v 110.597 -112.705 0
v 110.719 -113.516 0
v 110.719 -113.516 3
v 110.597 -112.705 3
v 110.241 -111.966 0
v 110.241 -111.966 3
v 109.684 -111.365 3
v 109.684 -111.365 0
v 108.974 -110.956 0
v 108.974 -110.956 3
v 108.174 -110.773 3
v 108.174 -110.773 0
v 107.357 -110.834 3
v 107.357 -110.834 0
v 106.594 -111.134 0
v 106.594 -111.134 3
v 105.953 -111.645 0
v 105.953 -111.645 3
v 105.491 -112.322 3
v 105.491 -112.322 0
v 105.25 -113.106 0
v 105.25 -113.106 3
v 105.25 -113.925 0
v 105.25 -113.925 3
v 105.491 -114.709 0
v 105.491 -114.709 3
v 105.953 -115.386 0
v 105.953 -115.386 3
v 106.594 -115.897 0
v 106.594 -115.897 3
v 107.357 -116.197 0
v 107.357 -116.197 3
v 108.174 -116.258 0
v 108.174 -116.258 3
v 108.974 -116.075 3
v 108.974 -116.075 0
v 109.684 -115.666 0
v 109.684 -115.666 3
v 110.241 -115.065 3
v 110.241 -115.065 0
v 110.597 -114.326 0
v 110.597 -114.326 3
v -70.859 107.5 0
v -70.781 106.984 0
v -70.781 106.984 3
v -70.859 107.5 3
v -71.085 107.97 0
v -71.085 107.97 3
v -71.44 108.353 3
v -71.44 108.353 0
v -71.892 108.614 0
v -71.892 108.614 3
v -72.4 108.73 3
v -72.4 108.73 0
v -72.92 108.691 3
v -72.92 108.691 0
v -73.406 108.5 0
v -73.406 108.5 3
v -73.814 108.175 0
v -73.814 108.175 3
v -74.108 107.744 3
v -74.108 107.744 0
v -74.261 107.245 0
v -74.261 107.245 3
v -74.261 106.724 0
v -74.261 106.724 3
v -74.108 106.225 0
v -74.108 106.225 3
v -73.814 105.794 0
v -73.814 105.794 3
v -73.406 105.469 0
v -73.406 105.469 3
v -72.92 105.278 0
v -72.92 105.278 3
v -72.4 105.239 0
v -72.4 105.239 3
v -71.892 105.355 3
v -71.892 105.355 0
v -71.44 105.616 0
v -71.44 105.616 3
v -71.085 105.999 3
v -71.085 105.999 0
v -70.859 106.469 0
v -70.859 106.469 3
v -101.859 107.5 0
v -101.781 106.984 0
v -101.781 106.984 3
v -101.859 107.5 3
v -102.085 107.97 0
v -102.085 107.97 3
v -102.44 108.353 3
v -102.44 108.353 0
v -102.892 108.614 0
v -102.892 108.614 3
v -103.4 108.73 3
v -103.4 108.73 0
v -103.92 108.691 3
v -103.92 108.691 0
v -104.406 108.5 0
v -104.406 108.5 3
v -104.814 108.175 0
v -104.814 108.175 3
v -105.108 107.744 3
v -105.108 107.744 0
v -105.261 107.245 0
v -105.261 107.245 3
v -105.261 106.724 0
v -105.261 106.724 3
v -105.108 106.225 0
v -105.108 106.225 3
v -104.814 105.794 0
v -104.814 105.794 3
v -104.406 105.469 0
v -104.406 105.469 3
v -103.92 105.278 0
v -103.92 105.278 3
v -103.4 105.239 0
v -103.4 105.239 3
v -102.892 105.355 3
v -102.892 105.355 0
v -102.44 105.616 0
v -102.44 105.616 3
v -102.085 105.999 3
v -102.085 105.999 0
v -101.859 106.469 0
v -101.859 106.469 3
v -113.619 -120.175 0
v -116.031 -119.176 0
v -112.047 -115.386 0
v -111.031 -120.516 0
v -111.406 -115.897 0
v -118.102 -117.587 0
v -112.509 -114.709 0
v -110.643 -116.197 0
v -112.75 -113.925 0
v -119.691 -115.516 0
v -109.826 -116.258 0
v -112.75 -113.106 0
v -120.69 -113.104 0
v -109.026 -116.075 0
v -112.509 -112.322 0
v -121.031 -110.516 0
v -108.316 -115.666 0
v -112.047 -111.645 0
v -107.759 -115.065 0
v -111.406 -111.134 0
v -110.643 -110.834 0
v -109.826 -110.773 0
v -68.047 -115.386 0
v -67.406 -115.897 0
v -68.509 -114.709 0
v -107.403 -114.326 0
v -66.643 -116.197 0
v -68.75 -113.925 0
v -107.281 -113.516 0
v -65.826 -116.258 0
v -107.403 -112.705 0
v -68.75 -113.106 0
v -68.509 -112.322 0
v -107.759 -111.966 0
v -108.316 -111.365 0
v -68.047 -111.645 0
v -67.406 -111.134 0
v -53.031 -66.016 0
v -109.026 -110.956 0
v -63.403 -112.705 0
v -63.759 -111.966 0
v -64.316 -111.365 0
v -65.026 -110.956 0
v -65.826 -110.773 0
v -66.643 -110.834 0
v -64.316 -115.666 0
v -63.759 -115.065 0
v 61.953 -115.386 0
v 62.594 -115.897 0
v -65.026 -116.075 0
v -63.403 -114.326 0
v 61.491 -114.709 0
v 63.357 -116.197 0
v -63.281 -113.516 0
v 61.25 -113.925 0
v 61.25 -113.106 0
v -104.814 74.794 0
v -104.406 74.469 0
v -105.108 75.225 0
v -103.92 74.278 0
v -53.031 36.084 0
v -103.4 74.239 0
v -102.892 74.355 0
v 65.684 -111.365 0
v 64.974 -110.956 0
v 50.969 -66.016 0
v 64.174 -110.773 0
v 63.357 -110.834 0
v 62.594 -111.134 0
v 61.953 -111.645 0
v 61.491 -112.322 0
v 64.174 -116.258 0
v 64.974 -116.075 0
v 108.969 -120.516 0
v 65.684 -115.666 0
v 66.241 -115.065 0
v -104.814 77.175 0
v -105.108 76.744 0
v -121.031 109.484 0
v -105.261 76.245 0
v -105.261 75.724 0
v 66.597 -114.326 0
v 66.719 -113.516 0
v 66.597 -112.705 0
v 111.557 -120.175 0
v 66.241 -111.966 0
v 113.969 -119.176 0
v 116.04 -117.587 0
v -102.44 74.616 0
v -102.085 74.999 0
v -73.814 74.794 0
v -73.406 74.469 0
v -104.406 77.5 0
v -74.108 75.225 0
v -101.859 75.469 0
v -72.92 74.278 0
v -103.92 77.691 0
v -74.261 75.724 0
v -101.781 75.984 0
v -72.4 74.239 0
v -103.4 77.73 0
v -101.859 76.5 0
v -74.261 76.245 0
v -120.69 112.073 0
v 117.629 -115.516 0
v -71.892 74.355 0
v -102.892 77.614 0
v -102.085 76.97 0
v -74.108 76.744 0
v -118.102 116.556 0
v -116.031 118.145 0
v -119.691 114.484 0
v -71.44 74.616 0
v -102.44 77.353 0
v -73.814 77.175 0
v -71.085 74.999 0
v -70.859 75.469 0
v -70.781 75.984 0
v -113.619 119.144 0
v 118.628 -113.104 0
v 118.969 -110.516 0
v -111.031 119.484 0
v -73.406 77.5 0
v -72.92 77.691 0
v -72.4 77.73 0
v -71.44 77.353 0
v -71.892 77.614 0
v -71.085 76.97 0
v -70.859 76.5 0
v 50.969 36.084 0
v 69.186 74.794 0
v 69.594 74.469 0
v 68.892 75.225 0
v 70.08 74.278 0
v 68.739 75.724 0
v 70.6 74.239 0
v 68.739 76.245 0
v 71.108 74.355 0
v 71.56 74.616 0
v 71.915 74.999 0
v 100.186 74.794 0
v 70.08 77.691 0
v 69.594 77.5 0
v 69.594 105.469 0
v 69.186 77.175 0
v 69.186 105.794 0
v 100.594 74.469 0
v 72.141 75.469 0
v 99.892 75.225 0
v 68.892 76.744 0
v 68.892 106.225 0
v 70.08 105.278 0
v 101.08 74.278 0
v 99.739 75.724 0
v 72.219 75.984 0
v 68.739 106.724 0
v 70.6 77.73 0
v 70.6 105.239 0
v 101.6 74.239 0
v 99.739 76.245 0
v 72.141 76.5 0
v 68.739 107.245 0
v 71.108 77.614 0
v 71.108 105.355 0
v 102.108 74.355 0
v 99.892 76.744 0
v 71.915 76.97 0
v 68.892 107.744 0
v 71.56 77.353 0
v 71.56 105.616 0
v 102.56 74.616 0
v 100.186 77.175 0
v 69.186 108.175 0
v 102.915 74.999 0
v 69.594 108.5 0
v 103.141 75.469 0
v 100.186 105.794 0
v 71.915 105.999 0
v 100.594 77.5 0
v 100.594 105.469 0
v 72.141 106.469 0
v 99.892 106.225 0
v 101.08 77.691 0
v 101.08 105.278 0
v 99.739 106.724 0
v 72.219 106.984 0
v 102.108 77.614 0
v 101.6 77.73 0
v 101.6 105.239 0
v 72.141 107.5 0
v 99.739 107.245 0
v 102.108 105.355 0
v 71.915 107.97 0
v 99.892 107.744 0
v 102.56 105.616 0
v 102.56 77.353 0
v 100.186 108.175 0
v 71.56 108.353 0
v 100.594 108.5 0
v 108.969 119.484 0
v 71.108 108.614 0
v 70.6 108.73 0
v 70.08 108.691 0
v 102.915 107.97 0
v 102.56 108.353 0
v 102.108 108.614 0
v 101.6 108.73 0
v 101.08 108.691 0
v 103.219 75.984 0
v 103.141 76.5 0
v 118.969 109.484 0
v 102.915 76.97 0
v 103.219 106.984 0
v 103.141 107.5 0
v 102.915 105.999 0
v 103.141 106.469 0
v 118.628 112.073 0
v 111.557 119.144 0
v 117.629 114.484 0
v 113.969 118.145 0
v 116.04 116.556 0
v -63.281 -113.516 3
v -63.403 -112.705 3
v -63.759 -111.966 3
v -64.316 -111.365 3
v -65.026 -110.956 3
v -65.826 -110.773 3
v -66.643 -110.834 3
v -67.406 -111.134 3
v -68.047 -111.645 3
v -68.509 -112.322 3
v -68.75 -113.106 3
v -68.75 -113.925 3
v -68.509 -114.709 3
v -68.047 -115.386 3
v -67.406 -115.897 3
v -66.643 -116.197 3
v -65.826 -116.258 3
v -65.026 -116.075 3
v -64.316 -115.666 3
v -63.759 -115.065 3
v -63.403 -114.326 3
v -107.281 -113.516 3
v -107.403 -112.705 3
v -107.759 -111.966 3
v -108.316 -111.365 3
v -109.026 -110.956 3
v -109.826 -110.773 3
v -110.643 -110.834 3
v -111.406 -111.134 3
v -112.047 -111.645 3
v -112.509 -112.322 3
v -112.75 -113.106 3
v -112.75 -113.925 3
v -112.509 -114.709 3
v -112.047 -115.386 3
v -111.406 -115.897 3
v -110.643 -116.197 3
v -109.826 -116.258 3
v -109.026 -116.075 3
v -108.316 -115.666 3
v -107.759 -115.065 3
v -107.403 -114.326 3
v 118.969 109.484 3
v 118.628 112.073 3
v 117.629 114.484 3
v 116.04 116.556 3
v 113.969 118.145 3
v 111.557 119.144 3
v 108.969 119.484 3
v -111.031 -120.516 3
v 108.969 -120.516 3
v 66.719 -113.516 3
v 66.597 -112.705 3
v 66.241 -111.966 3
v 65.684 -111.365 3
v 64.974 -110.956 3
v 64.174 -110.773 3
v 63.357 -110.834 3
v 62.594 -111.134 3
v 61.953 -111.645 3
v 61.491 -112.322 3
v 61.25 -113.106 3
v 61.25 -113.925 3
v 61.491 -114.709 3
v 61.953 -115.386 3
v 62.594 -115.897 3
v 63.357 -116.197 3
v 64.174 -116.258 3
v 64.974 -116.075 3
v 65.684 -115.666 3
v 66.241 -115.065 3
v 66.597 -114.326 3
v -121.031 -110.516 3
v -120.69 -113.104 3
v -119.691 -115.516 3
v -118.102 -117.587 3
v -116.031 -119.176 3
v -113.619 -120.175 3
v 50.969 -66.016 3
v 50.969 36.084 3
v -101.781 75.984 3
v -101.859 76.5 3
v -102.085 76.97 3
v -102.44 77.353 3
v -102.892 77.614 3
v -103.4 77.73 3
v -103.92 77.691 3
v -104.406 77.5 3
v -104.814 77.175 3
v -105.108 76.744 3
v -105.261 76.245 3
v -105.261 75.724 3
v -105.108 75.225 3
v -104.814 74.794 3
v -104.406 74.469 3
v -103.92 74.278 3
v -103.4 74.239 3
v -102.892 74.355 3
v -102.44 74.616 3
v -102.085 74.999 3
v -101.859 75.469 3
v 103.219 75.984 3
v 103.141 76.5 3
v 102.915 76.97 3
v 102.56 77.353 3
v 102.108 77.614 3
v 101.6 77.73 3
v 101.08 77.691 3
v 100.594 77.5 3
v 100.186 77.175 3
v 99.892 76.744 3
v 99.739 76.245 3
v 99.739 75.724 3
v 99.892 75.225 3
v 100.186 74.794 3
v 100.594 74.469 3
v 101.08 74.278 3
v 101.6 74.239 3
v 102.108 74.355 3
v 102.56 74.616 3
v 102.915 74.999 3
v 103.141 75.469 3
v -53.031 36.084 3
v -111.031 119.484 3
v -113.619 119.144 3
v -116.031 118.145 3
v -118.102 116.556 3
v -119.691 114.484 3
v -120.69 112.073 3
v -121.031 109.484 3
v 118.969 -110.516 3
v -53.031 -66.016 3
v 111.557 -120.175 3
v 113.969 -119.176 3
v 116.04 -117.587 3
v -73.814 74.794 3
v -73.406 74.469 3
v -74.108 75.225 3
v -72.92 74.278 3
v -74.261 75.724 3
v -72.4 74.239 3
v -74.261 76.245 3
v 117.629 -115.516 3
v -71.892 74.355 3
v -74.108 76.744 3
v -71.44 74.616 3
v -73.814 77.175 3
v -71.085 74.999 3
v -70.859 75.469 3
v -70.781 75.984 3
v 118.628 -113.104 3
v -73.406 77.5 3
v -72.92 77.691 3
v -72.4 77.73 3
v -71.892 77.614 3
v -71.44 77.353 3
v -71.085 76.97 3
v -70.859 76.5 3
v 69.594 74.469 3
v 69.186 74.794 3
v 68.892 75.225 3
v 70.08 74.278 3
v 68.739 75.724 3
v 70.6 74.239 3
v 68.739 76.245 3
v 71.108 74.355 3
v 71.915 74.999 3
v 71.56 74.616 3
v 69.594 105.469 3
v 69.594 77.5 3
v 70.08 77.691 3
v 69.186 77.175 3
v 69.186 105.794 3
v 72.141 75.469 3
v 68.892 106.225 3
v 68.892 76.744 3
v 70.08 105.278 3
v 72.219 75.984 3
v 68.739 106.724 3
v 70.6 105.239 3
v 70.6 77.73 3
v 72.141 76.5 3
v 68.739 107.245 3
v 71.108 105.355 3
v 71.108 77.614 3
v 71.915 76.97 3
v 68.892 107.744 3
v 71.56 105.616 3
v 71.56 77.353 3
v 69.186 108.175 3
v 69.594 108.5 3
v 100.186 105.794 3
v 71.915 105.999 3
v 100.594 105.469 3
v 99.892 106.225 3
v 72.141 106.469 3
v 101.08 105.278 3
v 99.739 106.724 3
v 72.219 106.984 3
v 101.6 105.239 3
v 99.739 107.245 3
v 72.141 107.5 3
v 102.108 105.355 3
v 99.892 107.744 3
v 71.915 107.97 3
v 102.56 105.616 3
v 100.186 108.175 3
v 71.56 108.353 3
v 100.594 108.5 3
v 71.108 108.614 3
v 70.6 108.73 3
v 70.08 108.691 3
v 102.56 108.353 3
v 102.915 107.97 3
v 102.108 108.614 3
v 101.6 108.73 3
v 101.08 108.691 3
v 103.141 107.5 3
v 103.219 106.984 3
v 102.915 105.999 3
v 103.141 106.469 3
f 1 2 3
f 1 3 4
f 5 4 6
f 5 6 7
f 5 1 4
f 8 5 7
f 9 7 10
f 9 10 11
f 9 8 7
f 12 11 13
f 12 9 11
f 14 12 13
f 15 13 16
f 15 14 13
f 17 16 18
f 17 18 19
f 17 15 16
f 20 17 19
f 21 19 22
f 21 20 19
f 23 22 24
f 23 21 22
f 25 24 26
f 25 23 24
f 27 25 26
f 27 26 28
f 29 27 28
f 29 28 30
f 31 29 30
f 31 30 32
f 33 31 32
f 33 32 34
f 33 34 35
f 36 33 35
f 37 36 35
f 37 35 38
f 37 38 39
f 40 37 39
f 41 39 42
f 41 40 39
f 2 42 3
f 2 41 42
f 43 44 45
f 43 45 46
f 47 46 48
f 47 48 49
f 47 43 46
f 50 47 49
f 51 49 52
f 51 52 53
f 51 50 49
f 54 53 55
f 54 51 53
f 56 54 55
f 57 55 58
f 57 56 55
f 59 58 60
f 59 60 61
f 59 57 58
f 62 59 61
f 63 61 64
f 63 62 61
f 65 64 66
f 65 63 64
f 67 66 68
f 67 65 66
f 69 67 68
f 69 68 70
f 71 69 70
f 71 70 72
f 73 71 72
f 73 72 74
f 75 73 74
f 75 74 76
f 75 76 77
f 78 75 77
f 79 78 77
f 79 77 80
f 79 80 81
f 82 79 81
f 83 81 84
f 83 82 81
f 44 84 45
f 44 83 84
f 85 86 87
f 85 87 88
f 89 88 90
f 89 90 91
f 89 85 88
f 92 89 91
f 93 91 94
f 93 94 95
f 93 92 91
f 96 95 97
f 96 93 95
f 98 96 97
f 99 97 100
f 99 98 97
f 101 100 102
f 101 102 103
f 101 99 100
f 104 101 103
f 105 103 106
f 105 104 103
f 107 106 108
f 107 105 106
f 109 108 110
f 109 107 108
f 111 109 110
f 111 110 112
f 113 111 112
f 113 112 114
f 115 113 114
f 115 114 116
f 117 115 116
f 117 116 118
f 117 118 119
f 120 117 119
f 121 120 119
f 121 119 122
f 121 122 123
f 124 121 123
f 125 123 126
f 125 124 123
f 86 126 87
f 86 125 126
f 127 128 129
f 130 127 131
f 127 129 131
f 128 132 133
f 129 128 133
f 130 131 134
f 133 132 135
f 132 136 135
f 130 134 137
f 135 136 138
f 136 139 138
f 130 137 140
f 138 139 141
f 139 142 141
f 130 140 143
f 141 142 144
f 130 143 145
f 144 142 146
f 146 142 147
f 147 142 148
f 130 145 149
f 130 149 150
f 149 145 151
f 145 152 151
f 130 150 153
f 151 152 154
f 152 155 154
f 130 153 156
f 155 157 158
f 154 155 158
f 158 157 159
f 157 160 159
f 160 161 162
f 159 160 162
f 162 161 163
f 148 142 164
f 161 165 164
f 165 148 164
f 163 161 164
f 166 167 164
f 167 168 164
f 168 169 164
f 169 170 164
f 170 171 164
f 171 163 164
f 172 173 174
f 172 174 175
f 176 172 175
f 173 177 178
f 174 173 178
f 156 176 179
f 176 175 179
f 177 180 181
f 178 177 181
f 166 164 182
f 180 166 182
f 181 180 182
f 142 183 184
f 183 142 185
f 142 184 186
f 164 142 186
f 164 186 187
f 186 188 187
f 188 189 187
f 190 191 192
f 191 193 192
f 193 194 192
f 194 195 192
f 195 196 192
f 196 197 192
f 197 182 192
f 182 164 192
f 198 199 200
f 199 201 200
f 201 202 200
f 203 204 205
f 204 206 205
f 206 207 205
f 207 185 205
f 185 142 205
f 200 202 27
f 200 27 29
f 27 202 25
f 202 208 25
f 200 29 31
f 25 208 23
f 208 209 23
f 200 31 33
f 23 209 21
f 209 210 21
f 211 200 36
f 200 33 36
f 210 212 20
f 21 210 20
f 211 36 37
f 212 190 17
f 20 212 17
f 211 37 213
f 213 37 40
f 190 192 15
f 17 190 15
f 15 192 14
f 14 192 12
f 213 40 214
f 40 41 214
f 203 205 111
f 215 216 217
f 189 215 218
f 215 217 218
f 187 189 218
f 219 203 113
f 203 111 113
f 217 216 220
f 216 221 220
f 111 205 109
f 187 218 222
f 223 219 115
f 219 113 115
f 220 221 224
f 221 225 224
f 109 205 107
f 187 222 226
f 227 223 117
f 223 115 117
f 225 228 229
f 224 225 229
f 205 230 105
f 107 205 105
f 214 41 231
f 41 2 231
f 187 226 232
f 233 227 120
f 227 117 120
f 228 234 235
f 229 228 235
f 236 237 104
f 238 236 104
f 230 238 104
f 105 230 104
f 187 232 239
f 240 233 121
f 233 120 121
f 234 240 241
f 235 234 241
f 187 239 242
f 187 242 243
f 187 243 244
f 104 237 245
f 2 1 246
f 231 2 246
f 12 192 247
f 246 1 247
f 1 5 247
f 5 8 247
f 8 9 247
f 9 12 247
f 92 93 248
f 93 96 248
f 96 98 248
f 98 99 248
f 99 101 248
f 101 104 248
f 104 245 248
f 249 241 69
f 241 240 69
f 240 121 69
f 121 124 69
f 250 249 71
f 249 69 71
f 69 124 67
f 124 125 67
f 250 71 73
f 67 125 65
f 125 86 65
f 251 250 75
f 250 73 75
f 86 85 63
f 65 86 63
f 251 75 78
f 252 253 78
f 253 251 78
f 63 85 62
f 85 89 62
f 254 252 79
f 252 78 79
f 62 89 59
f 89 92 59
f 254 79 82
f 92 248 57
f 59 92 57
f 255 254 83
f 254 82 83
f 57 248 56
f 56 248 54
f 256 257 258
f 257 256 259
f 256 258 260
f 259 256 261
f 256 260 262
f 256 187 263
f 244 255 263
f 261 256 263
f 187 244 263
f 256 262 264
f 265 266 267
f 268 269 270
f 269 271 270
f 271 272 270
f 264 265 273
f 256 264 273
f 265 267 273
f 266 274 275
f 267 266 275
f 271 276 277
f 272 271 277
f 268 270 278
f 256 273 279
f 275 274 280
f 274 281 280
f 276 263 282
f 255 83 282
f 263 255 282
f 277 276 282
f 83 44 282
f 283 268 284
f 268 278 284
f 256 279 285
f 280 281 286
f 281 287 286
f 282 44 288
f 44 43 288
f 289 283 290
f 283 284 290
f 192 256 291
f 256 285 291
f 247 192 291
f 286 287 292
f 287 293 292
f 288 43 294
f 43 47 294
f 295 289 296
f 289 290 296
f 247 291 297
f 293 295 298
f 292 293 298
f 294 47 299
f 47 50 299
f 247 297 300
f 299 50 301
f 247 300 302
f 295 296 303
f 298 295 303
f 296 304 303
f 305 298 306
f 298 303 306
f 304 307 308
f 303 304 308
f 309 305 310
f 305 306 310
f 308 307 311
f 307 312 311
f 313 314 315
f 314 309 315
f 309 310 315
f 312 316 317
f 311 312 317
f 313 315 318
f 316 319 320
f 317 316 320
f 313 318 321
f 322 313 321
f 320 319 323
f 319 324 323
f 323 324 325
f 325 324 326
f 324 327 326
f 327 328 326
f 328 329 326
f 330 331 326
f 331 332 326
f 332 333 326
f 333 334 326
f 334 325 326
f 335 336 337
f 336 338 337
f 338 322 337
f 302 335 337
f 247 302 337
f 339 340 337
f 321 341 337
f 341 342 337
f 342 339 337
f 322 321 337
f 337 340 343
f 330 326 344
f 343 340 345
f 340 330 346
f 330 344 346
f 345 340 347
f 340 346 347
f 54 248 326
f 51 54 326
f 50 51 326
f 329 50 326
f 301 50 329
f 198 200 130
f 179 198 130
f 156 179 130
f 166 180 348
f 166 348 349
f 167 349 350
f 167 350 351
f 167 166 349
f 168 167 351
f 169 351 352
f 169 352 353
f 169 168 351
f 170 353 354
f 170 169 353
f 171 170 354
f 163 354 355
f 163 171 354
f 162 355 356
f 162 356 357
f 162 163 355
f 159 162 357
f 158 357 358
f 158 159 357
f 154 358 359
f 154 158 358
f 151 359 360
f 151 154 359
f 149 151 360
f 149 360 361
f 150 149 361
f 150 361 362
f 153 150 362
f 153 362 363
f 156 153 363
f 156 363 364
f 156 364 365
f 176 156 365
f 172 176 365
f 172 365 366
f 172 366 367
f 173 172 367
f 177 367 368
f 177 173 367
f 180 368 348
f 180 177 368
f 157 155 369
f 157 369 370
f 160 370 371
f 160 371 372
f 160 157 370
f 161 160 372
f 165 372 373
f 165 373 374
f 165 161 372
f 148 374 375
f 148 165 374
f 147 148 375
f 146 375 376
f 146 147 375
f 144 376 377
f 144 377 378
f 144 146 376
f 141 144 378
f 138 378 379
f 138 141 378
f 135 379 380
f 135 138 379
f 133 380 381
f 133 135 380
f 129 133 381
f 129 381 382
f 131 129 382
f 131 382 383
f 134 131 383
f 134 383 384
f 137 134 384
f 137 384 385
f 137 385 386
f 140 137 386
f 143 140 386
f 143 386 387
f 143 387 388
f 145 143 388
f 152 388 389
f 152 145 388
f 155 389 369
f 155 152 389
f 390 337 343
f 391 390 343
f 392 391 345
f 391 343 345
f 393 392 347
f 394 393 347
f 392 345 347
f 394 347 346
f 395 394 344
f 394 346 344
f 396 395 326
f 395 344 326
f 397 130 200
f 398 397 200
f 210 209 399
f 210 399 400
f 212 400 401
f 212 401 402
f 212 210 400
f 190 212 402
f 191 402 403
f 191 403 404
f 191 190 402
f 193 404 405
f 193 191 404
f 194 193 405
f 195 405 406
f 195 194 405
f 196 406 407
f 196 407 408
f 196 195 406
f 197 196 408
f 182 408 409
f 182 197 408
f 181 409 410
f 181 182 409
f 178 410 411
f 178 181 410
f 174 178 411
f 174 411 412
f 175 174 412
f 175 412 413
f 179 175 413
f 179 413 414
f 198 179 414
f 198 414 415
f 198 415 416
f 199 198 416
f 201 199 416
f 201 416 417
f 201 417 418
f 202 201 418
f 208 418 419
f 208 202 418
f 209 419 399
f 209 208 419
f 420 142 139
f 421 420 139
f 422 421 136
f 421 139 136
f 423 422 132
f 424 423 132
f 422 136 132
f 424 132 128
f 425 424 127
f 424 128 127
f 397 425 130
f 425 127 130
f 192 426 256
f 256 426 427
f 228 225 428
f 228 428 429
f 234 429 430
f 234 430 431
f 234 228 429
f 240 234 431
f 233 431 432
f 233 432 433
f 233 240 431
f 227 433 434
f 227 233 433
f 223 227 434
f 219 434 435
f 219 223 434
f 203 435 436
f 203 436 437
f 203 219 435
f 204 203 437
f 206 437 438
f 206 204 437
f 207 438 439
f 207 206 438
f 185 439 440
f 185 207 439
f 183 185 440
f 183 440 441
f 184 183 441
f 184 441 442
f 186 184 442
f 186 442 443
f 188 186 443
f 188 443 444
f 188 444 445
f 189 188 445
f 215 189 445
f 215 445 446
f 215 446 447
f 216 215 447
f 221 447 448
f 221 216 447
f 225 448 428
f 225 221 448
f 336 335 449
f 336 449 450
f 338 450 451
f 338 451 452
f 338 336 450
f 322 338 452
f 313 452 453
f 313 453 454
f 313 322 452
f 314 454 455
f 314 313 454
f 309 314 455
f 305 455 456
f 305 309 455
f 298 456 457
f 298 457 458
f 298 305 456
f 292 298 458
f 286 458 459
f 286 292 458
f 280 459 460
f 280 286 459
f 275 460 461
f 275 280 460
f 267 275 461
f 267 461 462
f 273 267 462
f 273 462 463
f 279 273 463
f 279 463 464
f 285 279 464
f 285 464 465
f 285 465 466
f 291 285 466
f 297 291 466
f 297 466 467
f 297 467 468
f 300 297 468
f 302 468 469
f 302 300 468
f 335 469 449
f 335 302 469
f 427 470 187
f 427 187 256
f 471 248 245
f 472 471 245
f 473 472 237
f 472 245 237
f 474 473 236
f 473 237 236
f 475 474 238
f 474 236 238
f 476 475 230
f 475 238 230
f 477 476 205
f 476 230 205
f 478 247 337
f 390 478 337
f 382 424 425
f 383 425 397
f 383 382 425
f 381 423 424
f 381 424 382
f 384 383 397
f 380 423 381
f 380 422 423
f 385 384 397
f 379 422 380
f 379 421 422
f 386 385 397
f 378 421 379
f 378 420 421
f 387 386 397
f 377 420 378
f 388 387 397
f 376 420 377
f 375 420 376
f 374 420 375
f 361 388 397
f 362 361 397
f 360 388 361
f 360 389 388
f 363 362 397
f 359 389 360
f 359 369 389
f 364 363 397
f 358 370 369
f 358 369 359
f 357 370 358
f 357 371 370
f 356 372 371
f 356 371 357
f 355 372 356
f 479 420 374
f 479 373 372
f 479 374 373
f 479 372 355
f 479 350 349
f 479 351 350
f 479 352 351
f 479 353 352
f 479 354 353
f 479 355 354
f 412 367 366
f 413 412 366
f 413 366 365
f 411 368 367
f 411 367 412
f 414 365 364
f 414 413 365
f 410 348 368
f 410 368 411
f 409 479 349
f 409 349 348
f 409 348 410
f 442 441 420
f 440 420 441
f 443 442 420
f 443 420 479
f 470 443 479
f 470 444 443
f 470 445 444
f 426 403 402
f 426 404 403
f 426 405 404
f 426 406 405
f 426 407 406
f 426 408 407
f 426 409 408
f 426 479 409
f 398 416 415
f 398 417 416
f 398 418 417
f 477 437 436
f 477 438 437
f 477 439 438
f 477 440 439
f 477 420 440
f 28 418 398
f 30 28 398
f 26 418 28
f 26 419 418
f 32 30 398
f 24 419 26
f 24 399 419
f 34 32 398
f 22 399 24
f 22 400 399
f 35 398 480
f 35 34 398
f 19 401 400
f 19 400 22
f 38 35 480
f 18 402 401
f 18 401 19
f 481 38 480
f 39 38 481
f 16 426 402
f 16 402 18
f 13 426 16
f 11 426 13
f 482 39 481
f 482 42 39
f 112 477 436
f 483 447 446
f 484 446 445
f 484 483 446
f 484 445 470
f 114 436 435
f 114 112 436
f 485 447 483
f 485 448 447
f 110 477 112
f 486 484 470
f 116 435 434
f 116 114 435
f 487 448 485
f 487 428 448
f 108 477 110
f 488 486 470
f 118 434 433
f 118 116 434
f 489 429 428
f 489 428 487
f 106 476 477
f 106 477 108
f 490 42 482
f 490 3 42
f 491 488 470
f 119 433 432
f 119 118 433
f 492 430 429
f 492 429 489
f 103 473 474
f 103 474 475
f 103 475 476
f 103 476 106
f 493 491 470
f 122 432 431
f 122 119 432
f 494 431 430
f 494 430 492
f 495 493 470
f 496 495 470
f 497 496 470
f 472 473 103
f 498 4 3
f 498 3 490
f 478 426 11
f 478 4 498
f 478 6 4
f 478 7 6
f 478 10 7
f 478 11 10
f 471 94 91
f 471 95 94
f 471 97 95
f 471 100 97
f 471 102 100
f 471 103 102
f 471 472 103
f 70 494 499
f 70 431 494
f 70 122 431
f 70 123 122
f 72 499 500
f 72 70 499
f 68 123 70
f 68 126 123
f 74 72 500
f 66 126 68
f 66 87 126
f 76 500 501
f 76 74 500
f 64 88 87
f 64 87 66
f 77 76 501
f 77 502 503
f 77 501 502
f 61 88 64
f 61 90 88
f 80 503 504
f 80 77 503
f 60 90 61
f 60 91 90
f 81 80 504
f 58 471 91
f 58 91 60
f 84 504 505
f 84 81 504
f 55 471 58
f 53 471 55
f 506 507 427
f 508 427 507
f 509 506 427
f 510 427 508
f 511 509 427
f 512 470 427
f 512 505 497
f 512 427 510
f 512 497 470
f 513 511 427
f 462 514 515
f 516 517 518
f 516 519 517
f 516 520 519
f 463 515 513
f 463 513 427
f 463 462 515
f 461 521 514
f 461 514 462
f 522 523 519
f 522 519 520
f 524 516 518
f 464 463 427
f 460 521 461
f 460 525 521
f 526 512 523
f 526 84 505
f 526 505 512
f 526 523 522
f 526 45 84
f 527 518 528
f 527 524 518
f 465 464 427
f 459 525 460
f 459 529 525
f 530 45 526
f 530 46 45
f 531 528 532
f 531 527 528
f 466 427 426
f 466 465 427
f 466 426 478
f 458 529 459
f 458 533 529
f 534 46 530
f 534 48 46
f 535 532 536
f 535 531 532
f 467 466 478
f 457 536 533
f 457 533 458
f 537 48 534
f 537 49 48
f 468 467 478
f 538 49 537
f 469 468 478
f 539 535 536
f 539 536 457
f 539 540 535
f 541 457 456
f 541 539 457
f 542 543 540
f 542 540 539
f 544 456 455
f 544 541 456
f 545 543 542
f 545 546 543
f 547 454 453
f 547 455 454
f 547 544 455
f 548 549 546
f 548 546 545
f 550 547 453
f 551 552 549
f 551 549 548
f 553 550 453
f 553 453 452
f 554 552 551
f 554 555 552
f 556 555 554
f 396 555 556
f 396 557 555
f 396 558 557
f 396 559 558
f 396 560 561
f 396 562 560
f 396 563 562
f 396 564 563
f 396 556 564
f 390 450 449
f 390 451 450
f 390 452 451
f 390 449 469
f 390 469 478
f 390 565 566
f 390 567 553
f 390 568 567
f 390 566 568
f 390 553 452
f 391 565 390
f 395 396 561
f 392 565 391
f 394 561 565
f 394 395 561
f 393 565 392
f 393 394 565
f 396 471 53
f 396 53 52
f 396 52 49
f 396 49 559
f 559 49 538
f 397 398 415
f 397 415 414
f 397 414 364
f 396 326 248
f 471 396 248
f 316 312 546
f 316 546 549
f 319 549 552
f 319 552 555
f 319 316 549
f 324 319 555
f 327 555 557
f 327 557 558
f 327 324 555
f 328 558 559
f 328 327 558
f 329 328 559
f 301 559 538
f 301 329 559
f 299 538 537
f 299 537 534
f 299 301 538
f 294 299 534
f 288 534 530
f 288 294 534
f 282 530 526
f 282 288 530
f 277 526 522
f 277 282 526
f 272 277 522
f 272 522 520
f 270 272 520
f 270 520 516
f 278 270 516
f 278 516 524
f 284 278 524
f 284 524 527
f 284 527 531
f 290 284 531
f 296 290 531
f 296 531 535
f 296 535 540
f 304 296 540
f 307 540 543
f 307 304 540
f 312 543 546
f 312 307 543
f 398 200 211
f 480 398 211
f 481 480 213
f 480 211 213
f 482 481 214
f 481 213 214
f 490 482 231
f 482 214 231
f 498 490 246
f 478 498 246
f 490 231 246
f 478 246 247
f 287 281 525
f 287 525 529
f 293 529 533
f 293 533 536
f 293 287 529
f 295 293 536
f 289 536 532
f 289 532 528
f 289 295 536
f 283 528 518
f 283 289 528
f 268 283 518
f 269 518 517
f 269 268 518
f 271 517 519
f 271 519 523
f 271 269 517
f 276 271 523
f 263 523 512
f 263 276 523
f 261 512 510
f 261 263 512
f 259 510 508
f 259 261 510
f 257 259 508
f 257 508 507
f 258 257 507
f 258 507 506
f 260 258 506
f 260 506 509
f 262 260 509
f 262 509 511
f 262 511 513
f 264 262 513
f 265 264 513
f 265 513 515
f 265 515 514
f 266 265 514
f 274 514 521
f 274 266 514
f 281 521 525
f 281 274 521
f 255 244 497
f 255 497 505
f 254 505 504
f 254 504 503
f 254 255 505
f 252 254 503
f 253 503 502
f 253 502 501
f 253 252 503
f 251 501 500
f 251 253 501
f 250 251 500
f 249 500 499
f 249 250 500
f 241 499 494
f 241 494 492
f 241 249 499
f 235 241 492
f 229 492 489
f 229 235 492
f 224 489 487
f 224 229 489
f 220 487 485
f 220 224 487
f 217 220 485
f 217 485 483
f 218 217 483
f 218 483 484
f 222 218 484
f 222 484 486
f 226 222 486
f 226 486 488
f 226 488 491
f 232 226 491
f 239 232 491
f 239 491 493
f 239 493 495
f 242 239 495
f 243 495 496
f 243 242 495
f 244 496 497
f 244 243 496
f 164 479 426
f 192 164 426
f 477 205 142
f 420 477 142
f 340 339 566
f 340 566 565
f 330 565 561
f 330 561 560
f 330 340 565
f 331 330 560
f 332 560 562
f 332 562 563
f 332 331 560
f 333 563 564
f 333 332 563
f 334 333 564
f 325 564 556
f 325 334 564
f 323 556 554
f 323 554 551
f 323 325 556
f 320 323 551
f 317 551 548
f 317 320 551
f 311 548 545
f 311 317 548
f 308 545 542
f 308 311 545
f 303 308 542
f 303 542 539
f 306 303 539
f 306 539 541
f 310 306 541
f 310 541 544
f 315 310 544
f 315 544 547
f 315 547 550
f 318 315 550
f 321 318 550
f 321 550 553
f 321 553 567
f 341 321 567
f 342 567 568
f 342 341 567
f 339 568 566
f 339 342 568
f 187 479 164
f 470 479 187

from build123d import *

# Parameters (mm, degrees)
SKETCH3_R           = 1.75
SKETCH3_R_2         = 2.75
BOSS_EXTRUDE1_DEPTH = 3
SKETCH4_W           = 104
SKETCH4_H           = 102.1
CUT_EXTRUDE1_DEPTH  = 3


with BuildPart() as part:
    # Sketch3 → Boss-Extrude1 (new body)
    with BuildSketch(Plane.XY):
        with BuildLine():
            Line((118.968983292, -110.515508354), (118.968983292, 109.484491646))
            ThreePointArc((118.968983292, 109.484491646), (116.040051104, 116.555559458), (108.968983292, 119.484491646))
            Line((108.968983292, 119.484491646), (-111.031016708, 119.484491646))
            ThreePointArc((-111.031016708, 119.484491646), (-118.10208452, 116.555559458), (-121.031016708, 109.484491646))
            Line((-121.031016708, 109.484491646), (-121.031016708, -110.515508354))
            ThreePointArc((-121.031016708, -110.515508354), (-118.10208452, -117.586576166), (-111.031016708, -120.515508354))
            Line((-111.031016708, -120.515508354), (108.968983292, -120.515508354))
            ThreePointArc((108.968983292, -120.515508354), (116.040051104, -117.586576166), (118.968983292, -110.515508354))
        make_face()
        with Locations((-103.531016708, 75.984491646)):
            Circle(SKETCH3_R, mode=Mode.SUBTRACT)
        with Locations((-103.531016708, 106.984491646)):
            Circle(SKETCH3_R, mode=Mode.SUBTRACT)
        with Locations((-72.531016708, 106.984491646)):
            Circle(SKETCH3_R, mode=Mode.SUBTRACT)
        with Locations((-72.531016708, 75.984491646)):
            Circle(SKETCH3_R, mode=Mode.SUBTRACT)
        with Locations((-110.031016708, -113.515508354)):
            Circle(SKETCH3_R_2, mode=Mode.SUBTRACT)
        with Locations((-66.031016708, -113.515508354)):
            Circle(SKETCH3_R_2, mode=Mode.SUBTRACT)
        with Locations((63.968983292, -113.515508354)):
            Circle(SKETCH3_R_2, mode=Mode.SUBTRACT)
        with Locations((101.468983292, 75.984491646)):
            Circle(SKETCH3_R, mode=Mode.SUBTRACT)
        with Locations((101.468983292, 106.984491646)):
            Circle(SKETCH3_R, mode=Mode.SUBTRACT)
        with Locations((70.468983292, 106.984491646)):
            Circle(SKETCH3_R, mode=Mode.SUBTRACT)
        with Locations((70.468983292, 75.984491646)):
            Circle(SKETCH3_R, mode=Mode.SUBTRACT)
        with Locations((107.968983292, -113.515508354)):
            Circle(SKETCH3_R_2, mode=Mode.SUBTRACT)
    extrude(amount=BOSS_EXTRUDE1_DEPTH)

    # Sketch4 → Cut-Extrude1 (cut)
    with BuildSketch(Plane.XY.offset(3)):
        with Locations((-1.031016708, -14.965508354)):
            Rectangle(SKETCH4_W, SKETCH4_H)
    extrude(amount=-CUT_EXTRUDE1_DEPTH, mode=Mode.SUBTRACT)


solid = part.part
